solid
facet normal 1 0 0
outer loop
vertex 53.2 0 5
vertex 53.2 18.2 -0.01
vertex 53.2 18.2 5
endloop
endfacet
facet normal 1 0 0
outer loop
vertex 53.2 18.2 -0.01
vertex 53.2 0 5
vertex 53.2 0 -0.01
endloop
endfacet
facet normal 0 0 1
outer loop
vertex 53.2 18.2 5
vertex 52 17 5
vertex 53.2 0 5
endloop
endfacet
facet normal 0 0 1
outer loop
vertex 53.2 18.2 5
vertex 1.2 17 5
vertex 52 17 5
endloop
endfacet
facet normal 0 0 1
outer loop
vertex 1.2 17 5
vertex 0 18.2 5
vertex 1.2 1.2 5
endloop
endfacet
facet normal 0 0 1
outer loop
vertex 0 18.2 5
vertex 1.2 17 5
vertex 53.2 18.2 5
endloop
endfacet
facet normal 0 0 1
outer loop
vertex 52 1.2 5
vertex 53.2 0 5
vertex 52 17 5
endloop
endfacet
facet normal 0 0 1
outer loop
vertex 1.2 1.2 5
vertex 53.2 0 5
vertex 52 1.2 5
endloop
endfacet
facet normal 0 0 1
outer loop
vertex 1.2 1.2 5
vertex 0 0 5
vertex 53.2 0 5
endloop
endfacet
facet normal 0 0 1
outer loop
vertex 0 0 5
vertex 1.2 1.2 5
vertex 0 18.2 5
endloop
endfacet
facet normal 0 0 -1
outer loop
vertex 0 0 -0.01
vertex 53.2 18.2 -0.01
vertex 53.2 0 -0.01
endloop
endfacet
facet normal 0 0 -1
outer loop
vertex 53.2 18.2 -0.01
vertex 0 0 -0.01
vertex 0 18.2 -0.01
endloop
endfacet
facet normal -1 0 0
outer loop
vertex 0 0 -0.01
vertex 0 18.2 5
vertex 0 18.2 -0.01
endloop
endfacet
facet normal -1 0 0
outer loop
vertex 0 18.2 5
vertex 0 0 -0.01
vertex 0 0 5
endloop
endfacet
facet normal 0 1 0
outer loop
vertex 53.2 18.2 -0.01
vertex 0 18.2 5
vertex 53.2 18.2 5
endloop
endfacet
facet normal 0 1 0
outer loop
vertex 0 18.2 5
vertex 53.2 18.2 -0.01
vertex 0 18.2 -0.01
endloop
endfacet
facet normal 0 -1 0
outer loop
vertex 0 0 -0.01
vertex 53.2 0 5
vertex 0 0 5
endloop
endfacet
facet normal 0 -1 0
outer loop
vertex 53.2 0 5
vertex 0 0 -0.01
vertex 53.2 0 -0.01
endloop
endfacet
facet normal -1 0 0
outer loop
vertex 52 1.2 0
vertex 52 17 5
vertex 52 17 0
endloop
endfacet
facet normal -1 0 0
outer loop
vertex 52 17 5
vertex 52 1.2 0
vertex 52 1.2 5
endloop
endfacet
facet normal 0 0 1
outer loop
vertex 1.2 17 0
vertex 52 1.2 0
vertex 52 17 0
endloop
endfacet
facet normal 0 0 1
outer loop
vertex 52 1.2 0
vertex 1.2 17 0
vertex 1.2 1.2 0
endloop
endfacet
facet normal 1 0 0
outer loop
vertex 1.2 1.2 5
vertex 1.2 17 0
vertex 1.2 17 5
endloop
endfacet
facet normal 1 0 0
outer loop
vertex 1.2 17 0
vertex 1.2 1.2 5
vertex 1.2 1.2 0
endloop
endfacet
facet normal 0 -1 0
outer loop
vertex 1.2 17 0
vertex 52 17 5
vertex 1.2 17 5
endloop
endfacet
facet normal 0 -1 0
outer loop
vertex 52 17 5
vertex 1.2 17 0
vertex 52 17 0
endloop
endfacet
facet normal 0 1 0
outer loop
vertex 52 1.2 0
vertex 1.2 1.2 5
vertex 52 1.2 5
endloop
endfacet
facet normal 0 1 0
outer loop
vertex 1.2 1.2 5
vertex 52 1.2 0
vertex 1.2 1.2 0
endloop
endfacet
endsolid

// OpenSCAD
// file: ../Base/Rotation.scad
// Fischertechnik Box Foundation
// Geometry Helpers Rotation

include <PlacementOptions.scad>

// getRotatedSpace(space, rotation=NoRotation)
// Rotates the space dependent on the specified rotation

function getRotatedSpace(space, rotation=NoRotation) = [
    (rotation == Rotate90 || rotation == Rotate270) ? space.y : space.x,
    (rotation == Rotate90 || rotation == Rotate270) ? space.x : space.y
];

// Rotates the given space around the fixed left lower corner
// space = the space the children needs as width/depth list [width,depth]
// rotation = 0 Rotate0 degrees, 1 Rotate90 degrees, 2 Rotate180 degrees, 3 Rotate270 degrees (equivalent to -90)

module RotateFix(space, rotation=NoRotation) {
    dy = (rotation == Rotate0 || rotation == Rotate270) ? 0 :
        (rotation == Rotate90) ? space.x :
        space.y;
    dx = (rotation < Rotate180) ? 0 :
        (rotation == Rotate180) ? space.x :
        space.y;
    
    translate([dx, dy, 0])
        rotate([0, 0, rotations[rotation]])
            children();
}
// file: ../Base/Alignment.scad
// Fischertechnik Box Foundation
// Geometry Helpers Alignment

include <PlacementOptions.scad>

// getAlignedX(elementWidth, spaceWidth, align=AlignRight, offset=0)
// Gets the aligned X offset of an element with the given
// width in the given space.
// elementWidth = The width of the element to positon
// spaceWidth = The space where the element should be aligned
// align = 0 AlignLeft, 1 AlignCenter, 2 AlignRight
// offset = an optional offset from the aligned position. When
// aligned left or centered, then positive values are in X direction.
// When aligned right then positive values are in negative X direction.

function getAlignedX(elementWidth, spaceWidth, align=AlignRight, offset=0) =
    (align == AlignLeft) ?
        offset :
        ((align == AlignCenter) ?
        (spaceWidth - elementWidth)/2 + offset :
        spaceWidth - offset - elementWidth);

// getAlignedY(elementDepth, spaceDepth, align=AlignTop, offset=0)
// Gets the aligned Y offset of an element with the given
// depth in the given space.
// elementDepth = The depth of the element to positon
// spaceDepth = The space where the element should be aligned
// align = 0 AlignBottom, 1 AlignCenter, 2 AlignTop
// offset = an optional offset from the aligned position. When
// aligned bottom or centered, then positive values are in Y direction.
// When aligned top then positive values are in negative Y direction.

function getAlignedY(elementDepth, spaceDepth, align=AlignTop, offset=0) =
    (align == AlignBottom) ?
        offset :
        ((align == AlignCenter) ?
        (spaceDepth - elementDepth)/2 + offset :
        spaceDepth - offset - elementDepth);
// file: ../Base/PlacementOptions.scad
// Fischertechnik Box Foundation
// Placement Options

// Alignment
NoAlign = 0;
AlignLeft = 1;
AlignBottom = 2;
AlignCenter = 3;
AlignRight = 4;
AlignTop = 5;

// Element rotation degree steps
rotations = [0, -90, -180, -270];

// Rotation
NoRotation = 0;
Rotate0 = 0;
Rotate90 = 1;
Rotate180 = 2;
Rotate270 = 3;

// Docking (seen from above)
NoDock = -1;
DockLeft = 0;
DockTop = 1;
DockRight = 2;
DockCorner = 2;
DockBottom = 3;

// Web corners
LowerLeft = 0;
UpperLeft = 1;
UpperRight = 2;
LowerRight = 3;

// Web position relative to corner
LeftOfCorner = 0;
RightOfCorner = 1;
// file: ../Base/Boxes.scad
// Fischertechnik Box Foundation
// Pre-designed Boxes

use <Constants.scad>

include <PlacementOptions.scad>

box190Width = 190;
box190Depth = 130;
box130Width = 130;
box130Depth = 95;

// Values are from an original ec3 box
topBottomDifference = 1.5;
outerHeight = 40;
baseThickness = 1.8;
innerHeight = outerHeight - baseThickness;
stackExcess = 5.7;
radius = 3.5;
wallThickness = 1.5;
tolerance = 0.2;

boxWallThickness = wallThickness;
boxBaseThickness = baseThickness;
boxWebWidth = 3.0;

// getBoxWallThickness()
// Gets the wall thickness of a Fischertechnik Box
function getBoxWallThickness() = boxWallThickness;

// getBoxUsageHeight(height = 38.2)
// Gets the usable height of a Fischertechnik box
// height = Outer height of the box from the bottom to the upper edge.
function getBoxUsageHeight(height = outerHeight) = height - baseThickness - stackExcess;

// getBoxInnerHeight()
// Gets the inner height of a Fischertechnik box, including the stack excess
function getBoxInnerHeight() = innerHeight;

// getBoxBaseThickness()
// Gets the thickness of the Fischertechnik box base.
function getBoxBaseThickness() = boxBaseThickness;

// getBoxWebWidth()
// Gets the width of a box web
function getBoxWebWidth() = boxWebWidth;

// getBox190Space()
// Gets the usable inner space of a Box 190 as an x/y-list
function getBox190Space() = [
    box190Width - 2*getBoxWallThickness() - topBottomDifference, 
    box190Depth - 2*getBoxWallThickness() - topBottomDifference ];

// RoundedCornerPlate(width, depth, height, radius)
// Creates a body plate with rounded corners for a box. Used
// also to create the complete box with the hull module.
// width = Width of the plate
// depth = depth of the plate 
// height = thickness of the plate
// radius = radius of the rounded corner
module RoundedCornerPlate(width, depth, height, radius) {
    translate([radius, radius])
    hull() {
        w = width-2*radius;
        d = depth-2*radius;
        cube([w, d, height]);
        cylinder(height, r=radius, $fn=getFragments());
        translate([w, 0])
            cylinder(height, r=radius, $fn=getFragments());
        translate([w, d])
            cylinder(height, r=radius, $fn=getFragments());
        translate([0, d])
            cylinder(height, r=radius, $fn=getFragments());
    }
}

// BoxBase(width, depth)
// Creates an empty stackable Fischertechnik compatible box
// width = Outer width of the box (190, 130, ...)
// depth = Outer depth of the box (130, 95, ...)

module BoxBase(width, depth, height=outerHeight) {    
    thinPlate = 0.01;

    innerHeight = height - baseThickness;    
    
    module Body(tolerance=tolerance) {
        hull() {
            // Bottom with tolerance to fit into the original boxes when stacked
            translate([-wallThickness+tolerance, -wallThickness+tolerance, -baseThickness])
                RoundedCornerPlate(width-topBottomDifference-2*tolerance, depth-topBottomDifference-2*tolerance, thinPlate, radius);
            
            // Top
            translate([-wallThickness-topBottomDifference/2, -wallThickness-topBottomDifference/2, innerHeight-thinPlate])
                RoundedCornerPlate(width, depth, thinPlate, radius);
         }
    }

    module Cutoff() {
        hull() {
            coWidth = width - 2*wallThickness;
            coDepth = depth - 2*wallThickness;
            
            // Bottom
            RoundedCornerPlate(coWidth-topBottomDifference, coDepth-topBottomDifference, thinPlate, radius);

            // Top
            translate([-topBottomDifference/2, -topBottomDifference/2, innerHeight+thinPlate]) 
                RoundedCornerPlate(coWidth, coDepth, thinPlate, radius);
        }
    }
    
    difference() {        
        Body();
        Cutoff();
        stackOffset = innerHeight - stackExcess;
        translate([0, 0, stackOffset + baseThickness])
            Body(tolerance=0);
    }
}

// Creates the Fischertechnik empty box 130x190 mm and places it at position 0,0
// 190x130 are the outer sizes, the inner space is slightly smaller. Use getBox190Space() to get the inner sizes.
// The box is positioned that the usable inner space is at the 0,0,0 position.

module Box190() {
    BoxBase(box190Width, box190Depth);
}

// Gets the usable inner space of a Box 130 as an x/y-list
function getBox130Space() = [
    box130Width - 2*getBoxWallThickness() - topBottomDifference, 
    box130Depth - 2*getBoxWallThickness() - topBottomDifference ];

// Creates the Fischertechnik empty box 95x130 mm and places it at position 0,0
// 190x130 are the outer sizes, the inner space is slightly smaller. Use getBox190Space() to get the inner sizes.
// The box is positioned that the usable inner space is at the 0,0,0 position.

module Box130() {
    BoxBase(box130Width, box130Depth);
}

// Creates a web at the specified box walls
// corner 0 = LowerLeft, 1 = UpperLeft, 2 = UpperRight, 3 = LowerRight
// side 0 = LeftOfCorner, 1 = RightOfCorner
// distance = Distance in mm from the corner
// boxSpace = inner width and depth of the box (default: Box 190)
// webWidth = length of the web (default is 3 mms)
// webThickness = thickness of the web (default is 1 mm)
// height = Height of the web (standard is getBoxUsageHeight())
// sink = How much of the web is sunk into the wall

module BoxWeb(
    corner, 
    side, 
    distance, 
    boxSpace=getBox190Space(), 
    webWidth=getBoxWebWidth(), 
    webThickness=1.0, 
    height=getBoxUsageHeight(),
    sink = getBoxWallThickness()/2) {
    width = (corner % 2 == 0) ? 
            (side == LeftOfCorner ? webWidth : webThickness) :
            (side == LeftOfCorner ? webThickness : webWidth);

    depth = (corner % 2 == 0) ? 
            (side == RightOfCorner ? webWidth : webThickness) :
            (side == RightOfCorner ? webThickness : webWidth);
    
    xDiff = corner == LowerLeft ? 
                (side == LeftOfCorner ? -sink : distance) :
            (corner == UpperLeft ?                
                (side == LeftOfCorner ? distance : -sink) :
            (corner == UpperRight ?
                (side == LeftOfCorner ? boxSpace.x-webWidth+sink : boxSpace.x-distance-webThickness) :
                (side == LeftOfCorner ? boxSpace.x-distance-webThickness: boxSpace.x-webWidth+sink)));

    yDiff = corner == LowerLeft ? 
                (side == RightOfCorner ? -sink : distance) :
            (corner == UpperLeft ?
                (side == RightOfCorner ? boxSpace.y-distance-webThickness : boxSpace.y-webWidth+sink) :
            (corner == UpperRight ?
                (side == RightOfCorner ? boxSpace.y-webWidth+sink : boxSpace.y-distance-webThickness) :
                (side == RightOfCorner ? distance : -sink)));
    
    translate([xDiff, yDiff, -getExcess()])
        cube([width, depth, height + 2*getExcess()]);
}
// file: ../Base/Placement.scad
// Fischertechnik Box Foundation
// Geometry Helpers Placement

use <Constants.scad>
use <Alignment.scad>
use <Rotation.scad>
use <Boxes.scad>

include <PlacementOptions.scad>

// Place(x=0, y=0, elementSpace=[0,0], alignX=AlignLeft, alignY=AlignBottom, rotation=Rotate0, boxSpace=getBox190Space())
// Places the child at the specified position
// y = Y-Position. This is a relative position when an X aligment is specified.
// x = X-Position. This is a relative position when an Y aligment is specified.
// elementSpace = space of the element to be placed [x,y]
// alignX = -1=NoAlign, 0 AlignLeft, 1 AlignCenter, 3 AlignRight (elementSpace and boxSpace required!)
// alignY = -1=NoAlign, 2 AlignBottom, 1 AlignCenter, 4 AlignTop (elementSpace and boxSpace required!)
// rotation = 0 Rotate0 0 degrees, 1 Rotate90 90 degrees, 
// 2 Rotate180 180 degrees, 3 Rotate270 270 degrees (equivalent to -90)
// boxSpace = Inner space of the box where the placement occurs [x,y] - default is Box 190x130 inner space

module Place(x=0, y=0, elementSpace=[0,0], 
  alignX=AlignLeft, alignY=AlignBottom, 
  rotation=NoRotation, boxSpace=getBox190Space()) {

    module Position(x, y, space, rotation=Rotate0) {
        translate([x, y, 0])
            RotateFix(space, rotation)
                children();
    }

    space = getRotatedSpace(elementSpace, rotation);
    alignedX = getAlignedX(space.x, boxSpace.x, alignX, x);
    alignedY = getAlignedY(space.y, boxSpace.y, alignY, y);
    Position(alignedX, alignedY, elementSpace, rotation)
        children();
}

// Center(space=getBox130Space(), elementSpace=[0,0])
// space = Space where the children is centered. For cylinder use centered=true and no elementSpace.
// elementSpace = space of the element to be centered [x,y]

module Center(space=getBox190Space(), elementSpace=[0,0]) {
    Place(elementSpace=elementSpace, boxSpace=space, alignX=AlignCenter, alignY=AlignCenter)
        children();
}

// CenterHorizontal(width=0, y=0, offset=0, space=getBox130Space())
// width = Width of the element to be placed.
// y = Y position of the element
// offset = Offset from the center position (negative will be left of the center)
// space = Space where the element is placed

module CenterHorizontal(width=0, y=0, offset=0, space=getBox190Space()) {
    Place(x=offset, y=y, elementSpace=[width, 0], boxSpace=space, alignX=AlignCenter)
        children(0);
}

// CenterVertical(depth=0, x=0, offset=0, space=getBox130Space())
// depth = Depth of the element to be placed.
// x = X position of the element
// offset = Offset from the center position (negative will be down of the center)
// space = Space where the element is placed

module CenterVertical(depth=0, x=0, offset=0, space=getBox190Space()) {
    Place(x=x, y=offset, elementSpace=[0, depth], boxSpace=space, alignY=AlignCenter)
        children(0);
}

// getIsVertical(align)
// True if the specified alignment needs a vertical orientation for a divider (AlignRight, AlignLeft)

function getIsVertical(align) = (align == AlignRight || align == AlignLeft);

// getIsHorizontal(align)
// True if the specified alignment needs a horizontal orientation for a divider (AlignTop, AlignBottom)

function getIsHorizontal(align) = (align == AlignTop || align == AlignBottom);
// file: ../Base/Constants.scad
// Fischertechnik Box Foundation
// Constants

// Constant values necessary for multiple elements

// Base constants
dividerThickness = 1.2;
excess = 0.01;
fragments = 90;
tolerance = 0.8;

// Gets the thickness of a divider 
function getDividerThickness() = dividerThickness;

// Gets the excess that is used to merge walls into each other
function getExcess() = excess;

// Gets amount of fragments of a cylinder
function getFragments() = fragments;

// Gets the inner tolerance of a frame to each side
function getTolerance() = tolerance;


// Fischertechnik specific constants
axisDiameter = 4;
axisBottomDiameter = axisDiameter + 1;
axisTolerance = 0.2;

// Gets axis diameter of Fischertechnik axis
function getAxisDiameter() = axisDiameter;

// Gets axis diameter tolerance (subtracted for element axis)
function getAxisTolerance() = axisTolerance;

// Gets the axis diameter for standing axis
function getStandAxisDiameter() = getAxisDiameter() - getAxisTolerance();

// Gets axis bottom diameter for thicker part at the bottom
function getAxisBottomDiameter() = axisBottomDiameter;

pinHeight = 2.5;

// gets the height of a connecting pin
function getPinHeight() = pinHeight;

standardEdgeDistance = 2.5;
standardWebDistance = 11.5;
standardCornerLength = 15;

// gets the standard distance to the wall of the box for dockable frames with webs
function getStandardEdgeDistance() = standardEdgeDistance;

// gets the standard distance of each web to the corner of the dockable frame
function getStandardWebDistance() = standardWebDistance;

// gets the standard length of the corner walls of a dockable frame
function getStandardCornerLength() = standardCornerLength;

tubeWallFactor = 0.8;

// gets the wall thickness of a tube.
function getTubeWallThickness() = tubeWallFactor * getDividerThickness();

smallPartsFrameHeight = 20;

// gets the frame height for docked small parts boxes.
function getSmallPartsFrameHeight() = smallPartsFrameHeight;

hubRingDiameter = 19.5;
hubRingLevelDiameter = 21;

// gets the diameter of a tube matching the inner ring of a wheel
function getHubRingDiameter() = hubRingDiameter;

// gets the diameter of a hub tube with a thicker diameter
function getHubRingLevelDiameter() = hubRingLevelDiameter;
// main file
// Fischertechnik Box Library
// Frame for Hinged Block
// 31008

use <../Base/Constants.scad>
use <../ModelBase/Simple.scad>

/* [Hidden] */
width = 50;
depth = 15;
height = 5;

// getFrameHingedBlockSpace()
// Gets the space for the hinged block frame.

function getFrameHingedBlockSpace() = getFrameOuterVolume([width, depth, height]);

// FrameHingedBlock()
// Frame for hinged block (strait)
// 31008

module FrameHingedBlock() {
    Frame([width, depth, height]);
}

// Test
color("lightgray")
FrameHingedBlock();
